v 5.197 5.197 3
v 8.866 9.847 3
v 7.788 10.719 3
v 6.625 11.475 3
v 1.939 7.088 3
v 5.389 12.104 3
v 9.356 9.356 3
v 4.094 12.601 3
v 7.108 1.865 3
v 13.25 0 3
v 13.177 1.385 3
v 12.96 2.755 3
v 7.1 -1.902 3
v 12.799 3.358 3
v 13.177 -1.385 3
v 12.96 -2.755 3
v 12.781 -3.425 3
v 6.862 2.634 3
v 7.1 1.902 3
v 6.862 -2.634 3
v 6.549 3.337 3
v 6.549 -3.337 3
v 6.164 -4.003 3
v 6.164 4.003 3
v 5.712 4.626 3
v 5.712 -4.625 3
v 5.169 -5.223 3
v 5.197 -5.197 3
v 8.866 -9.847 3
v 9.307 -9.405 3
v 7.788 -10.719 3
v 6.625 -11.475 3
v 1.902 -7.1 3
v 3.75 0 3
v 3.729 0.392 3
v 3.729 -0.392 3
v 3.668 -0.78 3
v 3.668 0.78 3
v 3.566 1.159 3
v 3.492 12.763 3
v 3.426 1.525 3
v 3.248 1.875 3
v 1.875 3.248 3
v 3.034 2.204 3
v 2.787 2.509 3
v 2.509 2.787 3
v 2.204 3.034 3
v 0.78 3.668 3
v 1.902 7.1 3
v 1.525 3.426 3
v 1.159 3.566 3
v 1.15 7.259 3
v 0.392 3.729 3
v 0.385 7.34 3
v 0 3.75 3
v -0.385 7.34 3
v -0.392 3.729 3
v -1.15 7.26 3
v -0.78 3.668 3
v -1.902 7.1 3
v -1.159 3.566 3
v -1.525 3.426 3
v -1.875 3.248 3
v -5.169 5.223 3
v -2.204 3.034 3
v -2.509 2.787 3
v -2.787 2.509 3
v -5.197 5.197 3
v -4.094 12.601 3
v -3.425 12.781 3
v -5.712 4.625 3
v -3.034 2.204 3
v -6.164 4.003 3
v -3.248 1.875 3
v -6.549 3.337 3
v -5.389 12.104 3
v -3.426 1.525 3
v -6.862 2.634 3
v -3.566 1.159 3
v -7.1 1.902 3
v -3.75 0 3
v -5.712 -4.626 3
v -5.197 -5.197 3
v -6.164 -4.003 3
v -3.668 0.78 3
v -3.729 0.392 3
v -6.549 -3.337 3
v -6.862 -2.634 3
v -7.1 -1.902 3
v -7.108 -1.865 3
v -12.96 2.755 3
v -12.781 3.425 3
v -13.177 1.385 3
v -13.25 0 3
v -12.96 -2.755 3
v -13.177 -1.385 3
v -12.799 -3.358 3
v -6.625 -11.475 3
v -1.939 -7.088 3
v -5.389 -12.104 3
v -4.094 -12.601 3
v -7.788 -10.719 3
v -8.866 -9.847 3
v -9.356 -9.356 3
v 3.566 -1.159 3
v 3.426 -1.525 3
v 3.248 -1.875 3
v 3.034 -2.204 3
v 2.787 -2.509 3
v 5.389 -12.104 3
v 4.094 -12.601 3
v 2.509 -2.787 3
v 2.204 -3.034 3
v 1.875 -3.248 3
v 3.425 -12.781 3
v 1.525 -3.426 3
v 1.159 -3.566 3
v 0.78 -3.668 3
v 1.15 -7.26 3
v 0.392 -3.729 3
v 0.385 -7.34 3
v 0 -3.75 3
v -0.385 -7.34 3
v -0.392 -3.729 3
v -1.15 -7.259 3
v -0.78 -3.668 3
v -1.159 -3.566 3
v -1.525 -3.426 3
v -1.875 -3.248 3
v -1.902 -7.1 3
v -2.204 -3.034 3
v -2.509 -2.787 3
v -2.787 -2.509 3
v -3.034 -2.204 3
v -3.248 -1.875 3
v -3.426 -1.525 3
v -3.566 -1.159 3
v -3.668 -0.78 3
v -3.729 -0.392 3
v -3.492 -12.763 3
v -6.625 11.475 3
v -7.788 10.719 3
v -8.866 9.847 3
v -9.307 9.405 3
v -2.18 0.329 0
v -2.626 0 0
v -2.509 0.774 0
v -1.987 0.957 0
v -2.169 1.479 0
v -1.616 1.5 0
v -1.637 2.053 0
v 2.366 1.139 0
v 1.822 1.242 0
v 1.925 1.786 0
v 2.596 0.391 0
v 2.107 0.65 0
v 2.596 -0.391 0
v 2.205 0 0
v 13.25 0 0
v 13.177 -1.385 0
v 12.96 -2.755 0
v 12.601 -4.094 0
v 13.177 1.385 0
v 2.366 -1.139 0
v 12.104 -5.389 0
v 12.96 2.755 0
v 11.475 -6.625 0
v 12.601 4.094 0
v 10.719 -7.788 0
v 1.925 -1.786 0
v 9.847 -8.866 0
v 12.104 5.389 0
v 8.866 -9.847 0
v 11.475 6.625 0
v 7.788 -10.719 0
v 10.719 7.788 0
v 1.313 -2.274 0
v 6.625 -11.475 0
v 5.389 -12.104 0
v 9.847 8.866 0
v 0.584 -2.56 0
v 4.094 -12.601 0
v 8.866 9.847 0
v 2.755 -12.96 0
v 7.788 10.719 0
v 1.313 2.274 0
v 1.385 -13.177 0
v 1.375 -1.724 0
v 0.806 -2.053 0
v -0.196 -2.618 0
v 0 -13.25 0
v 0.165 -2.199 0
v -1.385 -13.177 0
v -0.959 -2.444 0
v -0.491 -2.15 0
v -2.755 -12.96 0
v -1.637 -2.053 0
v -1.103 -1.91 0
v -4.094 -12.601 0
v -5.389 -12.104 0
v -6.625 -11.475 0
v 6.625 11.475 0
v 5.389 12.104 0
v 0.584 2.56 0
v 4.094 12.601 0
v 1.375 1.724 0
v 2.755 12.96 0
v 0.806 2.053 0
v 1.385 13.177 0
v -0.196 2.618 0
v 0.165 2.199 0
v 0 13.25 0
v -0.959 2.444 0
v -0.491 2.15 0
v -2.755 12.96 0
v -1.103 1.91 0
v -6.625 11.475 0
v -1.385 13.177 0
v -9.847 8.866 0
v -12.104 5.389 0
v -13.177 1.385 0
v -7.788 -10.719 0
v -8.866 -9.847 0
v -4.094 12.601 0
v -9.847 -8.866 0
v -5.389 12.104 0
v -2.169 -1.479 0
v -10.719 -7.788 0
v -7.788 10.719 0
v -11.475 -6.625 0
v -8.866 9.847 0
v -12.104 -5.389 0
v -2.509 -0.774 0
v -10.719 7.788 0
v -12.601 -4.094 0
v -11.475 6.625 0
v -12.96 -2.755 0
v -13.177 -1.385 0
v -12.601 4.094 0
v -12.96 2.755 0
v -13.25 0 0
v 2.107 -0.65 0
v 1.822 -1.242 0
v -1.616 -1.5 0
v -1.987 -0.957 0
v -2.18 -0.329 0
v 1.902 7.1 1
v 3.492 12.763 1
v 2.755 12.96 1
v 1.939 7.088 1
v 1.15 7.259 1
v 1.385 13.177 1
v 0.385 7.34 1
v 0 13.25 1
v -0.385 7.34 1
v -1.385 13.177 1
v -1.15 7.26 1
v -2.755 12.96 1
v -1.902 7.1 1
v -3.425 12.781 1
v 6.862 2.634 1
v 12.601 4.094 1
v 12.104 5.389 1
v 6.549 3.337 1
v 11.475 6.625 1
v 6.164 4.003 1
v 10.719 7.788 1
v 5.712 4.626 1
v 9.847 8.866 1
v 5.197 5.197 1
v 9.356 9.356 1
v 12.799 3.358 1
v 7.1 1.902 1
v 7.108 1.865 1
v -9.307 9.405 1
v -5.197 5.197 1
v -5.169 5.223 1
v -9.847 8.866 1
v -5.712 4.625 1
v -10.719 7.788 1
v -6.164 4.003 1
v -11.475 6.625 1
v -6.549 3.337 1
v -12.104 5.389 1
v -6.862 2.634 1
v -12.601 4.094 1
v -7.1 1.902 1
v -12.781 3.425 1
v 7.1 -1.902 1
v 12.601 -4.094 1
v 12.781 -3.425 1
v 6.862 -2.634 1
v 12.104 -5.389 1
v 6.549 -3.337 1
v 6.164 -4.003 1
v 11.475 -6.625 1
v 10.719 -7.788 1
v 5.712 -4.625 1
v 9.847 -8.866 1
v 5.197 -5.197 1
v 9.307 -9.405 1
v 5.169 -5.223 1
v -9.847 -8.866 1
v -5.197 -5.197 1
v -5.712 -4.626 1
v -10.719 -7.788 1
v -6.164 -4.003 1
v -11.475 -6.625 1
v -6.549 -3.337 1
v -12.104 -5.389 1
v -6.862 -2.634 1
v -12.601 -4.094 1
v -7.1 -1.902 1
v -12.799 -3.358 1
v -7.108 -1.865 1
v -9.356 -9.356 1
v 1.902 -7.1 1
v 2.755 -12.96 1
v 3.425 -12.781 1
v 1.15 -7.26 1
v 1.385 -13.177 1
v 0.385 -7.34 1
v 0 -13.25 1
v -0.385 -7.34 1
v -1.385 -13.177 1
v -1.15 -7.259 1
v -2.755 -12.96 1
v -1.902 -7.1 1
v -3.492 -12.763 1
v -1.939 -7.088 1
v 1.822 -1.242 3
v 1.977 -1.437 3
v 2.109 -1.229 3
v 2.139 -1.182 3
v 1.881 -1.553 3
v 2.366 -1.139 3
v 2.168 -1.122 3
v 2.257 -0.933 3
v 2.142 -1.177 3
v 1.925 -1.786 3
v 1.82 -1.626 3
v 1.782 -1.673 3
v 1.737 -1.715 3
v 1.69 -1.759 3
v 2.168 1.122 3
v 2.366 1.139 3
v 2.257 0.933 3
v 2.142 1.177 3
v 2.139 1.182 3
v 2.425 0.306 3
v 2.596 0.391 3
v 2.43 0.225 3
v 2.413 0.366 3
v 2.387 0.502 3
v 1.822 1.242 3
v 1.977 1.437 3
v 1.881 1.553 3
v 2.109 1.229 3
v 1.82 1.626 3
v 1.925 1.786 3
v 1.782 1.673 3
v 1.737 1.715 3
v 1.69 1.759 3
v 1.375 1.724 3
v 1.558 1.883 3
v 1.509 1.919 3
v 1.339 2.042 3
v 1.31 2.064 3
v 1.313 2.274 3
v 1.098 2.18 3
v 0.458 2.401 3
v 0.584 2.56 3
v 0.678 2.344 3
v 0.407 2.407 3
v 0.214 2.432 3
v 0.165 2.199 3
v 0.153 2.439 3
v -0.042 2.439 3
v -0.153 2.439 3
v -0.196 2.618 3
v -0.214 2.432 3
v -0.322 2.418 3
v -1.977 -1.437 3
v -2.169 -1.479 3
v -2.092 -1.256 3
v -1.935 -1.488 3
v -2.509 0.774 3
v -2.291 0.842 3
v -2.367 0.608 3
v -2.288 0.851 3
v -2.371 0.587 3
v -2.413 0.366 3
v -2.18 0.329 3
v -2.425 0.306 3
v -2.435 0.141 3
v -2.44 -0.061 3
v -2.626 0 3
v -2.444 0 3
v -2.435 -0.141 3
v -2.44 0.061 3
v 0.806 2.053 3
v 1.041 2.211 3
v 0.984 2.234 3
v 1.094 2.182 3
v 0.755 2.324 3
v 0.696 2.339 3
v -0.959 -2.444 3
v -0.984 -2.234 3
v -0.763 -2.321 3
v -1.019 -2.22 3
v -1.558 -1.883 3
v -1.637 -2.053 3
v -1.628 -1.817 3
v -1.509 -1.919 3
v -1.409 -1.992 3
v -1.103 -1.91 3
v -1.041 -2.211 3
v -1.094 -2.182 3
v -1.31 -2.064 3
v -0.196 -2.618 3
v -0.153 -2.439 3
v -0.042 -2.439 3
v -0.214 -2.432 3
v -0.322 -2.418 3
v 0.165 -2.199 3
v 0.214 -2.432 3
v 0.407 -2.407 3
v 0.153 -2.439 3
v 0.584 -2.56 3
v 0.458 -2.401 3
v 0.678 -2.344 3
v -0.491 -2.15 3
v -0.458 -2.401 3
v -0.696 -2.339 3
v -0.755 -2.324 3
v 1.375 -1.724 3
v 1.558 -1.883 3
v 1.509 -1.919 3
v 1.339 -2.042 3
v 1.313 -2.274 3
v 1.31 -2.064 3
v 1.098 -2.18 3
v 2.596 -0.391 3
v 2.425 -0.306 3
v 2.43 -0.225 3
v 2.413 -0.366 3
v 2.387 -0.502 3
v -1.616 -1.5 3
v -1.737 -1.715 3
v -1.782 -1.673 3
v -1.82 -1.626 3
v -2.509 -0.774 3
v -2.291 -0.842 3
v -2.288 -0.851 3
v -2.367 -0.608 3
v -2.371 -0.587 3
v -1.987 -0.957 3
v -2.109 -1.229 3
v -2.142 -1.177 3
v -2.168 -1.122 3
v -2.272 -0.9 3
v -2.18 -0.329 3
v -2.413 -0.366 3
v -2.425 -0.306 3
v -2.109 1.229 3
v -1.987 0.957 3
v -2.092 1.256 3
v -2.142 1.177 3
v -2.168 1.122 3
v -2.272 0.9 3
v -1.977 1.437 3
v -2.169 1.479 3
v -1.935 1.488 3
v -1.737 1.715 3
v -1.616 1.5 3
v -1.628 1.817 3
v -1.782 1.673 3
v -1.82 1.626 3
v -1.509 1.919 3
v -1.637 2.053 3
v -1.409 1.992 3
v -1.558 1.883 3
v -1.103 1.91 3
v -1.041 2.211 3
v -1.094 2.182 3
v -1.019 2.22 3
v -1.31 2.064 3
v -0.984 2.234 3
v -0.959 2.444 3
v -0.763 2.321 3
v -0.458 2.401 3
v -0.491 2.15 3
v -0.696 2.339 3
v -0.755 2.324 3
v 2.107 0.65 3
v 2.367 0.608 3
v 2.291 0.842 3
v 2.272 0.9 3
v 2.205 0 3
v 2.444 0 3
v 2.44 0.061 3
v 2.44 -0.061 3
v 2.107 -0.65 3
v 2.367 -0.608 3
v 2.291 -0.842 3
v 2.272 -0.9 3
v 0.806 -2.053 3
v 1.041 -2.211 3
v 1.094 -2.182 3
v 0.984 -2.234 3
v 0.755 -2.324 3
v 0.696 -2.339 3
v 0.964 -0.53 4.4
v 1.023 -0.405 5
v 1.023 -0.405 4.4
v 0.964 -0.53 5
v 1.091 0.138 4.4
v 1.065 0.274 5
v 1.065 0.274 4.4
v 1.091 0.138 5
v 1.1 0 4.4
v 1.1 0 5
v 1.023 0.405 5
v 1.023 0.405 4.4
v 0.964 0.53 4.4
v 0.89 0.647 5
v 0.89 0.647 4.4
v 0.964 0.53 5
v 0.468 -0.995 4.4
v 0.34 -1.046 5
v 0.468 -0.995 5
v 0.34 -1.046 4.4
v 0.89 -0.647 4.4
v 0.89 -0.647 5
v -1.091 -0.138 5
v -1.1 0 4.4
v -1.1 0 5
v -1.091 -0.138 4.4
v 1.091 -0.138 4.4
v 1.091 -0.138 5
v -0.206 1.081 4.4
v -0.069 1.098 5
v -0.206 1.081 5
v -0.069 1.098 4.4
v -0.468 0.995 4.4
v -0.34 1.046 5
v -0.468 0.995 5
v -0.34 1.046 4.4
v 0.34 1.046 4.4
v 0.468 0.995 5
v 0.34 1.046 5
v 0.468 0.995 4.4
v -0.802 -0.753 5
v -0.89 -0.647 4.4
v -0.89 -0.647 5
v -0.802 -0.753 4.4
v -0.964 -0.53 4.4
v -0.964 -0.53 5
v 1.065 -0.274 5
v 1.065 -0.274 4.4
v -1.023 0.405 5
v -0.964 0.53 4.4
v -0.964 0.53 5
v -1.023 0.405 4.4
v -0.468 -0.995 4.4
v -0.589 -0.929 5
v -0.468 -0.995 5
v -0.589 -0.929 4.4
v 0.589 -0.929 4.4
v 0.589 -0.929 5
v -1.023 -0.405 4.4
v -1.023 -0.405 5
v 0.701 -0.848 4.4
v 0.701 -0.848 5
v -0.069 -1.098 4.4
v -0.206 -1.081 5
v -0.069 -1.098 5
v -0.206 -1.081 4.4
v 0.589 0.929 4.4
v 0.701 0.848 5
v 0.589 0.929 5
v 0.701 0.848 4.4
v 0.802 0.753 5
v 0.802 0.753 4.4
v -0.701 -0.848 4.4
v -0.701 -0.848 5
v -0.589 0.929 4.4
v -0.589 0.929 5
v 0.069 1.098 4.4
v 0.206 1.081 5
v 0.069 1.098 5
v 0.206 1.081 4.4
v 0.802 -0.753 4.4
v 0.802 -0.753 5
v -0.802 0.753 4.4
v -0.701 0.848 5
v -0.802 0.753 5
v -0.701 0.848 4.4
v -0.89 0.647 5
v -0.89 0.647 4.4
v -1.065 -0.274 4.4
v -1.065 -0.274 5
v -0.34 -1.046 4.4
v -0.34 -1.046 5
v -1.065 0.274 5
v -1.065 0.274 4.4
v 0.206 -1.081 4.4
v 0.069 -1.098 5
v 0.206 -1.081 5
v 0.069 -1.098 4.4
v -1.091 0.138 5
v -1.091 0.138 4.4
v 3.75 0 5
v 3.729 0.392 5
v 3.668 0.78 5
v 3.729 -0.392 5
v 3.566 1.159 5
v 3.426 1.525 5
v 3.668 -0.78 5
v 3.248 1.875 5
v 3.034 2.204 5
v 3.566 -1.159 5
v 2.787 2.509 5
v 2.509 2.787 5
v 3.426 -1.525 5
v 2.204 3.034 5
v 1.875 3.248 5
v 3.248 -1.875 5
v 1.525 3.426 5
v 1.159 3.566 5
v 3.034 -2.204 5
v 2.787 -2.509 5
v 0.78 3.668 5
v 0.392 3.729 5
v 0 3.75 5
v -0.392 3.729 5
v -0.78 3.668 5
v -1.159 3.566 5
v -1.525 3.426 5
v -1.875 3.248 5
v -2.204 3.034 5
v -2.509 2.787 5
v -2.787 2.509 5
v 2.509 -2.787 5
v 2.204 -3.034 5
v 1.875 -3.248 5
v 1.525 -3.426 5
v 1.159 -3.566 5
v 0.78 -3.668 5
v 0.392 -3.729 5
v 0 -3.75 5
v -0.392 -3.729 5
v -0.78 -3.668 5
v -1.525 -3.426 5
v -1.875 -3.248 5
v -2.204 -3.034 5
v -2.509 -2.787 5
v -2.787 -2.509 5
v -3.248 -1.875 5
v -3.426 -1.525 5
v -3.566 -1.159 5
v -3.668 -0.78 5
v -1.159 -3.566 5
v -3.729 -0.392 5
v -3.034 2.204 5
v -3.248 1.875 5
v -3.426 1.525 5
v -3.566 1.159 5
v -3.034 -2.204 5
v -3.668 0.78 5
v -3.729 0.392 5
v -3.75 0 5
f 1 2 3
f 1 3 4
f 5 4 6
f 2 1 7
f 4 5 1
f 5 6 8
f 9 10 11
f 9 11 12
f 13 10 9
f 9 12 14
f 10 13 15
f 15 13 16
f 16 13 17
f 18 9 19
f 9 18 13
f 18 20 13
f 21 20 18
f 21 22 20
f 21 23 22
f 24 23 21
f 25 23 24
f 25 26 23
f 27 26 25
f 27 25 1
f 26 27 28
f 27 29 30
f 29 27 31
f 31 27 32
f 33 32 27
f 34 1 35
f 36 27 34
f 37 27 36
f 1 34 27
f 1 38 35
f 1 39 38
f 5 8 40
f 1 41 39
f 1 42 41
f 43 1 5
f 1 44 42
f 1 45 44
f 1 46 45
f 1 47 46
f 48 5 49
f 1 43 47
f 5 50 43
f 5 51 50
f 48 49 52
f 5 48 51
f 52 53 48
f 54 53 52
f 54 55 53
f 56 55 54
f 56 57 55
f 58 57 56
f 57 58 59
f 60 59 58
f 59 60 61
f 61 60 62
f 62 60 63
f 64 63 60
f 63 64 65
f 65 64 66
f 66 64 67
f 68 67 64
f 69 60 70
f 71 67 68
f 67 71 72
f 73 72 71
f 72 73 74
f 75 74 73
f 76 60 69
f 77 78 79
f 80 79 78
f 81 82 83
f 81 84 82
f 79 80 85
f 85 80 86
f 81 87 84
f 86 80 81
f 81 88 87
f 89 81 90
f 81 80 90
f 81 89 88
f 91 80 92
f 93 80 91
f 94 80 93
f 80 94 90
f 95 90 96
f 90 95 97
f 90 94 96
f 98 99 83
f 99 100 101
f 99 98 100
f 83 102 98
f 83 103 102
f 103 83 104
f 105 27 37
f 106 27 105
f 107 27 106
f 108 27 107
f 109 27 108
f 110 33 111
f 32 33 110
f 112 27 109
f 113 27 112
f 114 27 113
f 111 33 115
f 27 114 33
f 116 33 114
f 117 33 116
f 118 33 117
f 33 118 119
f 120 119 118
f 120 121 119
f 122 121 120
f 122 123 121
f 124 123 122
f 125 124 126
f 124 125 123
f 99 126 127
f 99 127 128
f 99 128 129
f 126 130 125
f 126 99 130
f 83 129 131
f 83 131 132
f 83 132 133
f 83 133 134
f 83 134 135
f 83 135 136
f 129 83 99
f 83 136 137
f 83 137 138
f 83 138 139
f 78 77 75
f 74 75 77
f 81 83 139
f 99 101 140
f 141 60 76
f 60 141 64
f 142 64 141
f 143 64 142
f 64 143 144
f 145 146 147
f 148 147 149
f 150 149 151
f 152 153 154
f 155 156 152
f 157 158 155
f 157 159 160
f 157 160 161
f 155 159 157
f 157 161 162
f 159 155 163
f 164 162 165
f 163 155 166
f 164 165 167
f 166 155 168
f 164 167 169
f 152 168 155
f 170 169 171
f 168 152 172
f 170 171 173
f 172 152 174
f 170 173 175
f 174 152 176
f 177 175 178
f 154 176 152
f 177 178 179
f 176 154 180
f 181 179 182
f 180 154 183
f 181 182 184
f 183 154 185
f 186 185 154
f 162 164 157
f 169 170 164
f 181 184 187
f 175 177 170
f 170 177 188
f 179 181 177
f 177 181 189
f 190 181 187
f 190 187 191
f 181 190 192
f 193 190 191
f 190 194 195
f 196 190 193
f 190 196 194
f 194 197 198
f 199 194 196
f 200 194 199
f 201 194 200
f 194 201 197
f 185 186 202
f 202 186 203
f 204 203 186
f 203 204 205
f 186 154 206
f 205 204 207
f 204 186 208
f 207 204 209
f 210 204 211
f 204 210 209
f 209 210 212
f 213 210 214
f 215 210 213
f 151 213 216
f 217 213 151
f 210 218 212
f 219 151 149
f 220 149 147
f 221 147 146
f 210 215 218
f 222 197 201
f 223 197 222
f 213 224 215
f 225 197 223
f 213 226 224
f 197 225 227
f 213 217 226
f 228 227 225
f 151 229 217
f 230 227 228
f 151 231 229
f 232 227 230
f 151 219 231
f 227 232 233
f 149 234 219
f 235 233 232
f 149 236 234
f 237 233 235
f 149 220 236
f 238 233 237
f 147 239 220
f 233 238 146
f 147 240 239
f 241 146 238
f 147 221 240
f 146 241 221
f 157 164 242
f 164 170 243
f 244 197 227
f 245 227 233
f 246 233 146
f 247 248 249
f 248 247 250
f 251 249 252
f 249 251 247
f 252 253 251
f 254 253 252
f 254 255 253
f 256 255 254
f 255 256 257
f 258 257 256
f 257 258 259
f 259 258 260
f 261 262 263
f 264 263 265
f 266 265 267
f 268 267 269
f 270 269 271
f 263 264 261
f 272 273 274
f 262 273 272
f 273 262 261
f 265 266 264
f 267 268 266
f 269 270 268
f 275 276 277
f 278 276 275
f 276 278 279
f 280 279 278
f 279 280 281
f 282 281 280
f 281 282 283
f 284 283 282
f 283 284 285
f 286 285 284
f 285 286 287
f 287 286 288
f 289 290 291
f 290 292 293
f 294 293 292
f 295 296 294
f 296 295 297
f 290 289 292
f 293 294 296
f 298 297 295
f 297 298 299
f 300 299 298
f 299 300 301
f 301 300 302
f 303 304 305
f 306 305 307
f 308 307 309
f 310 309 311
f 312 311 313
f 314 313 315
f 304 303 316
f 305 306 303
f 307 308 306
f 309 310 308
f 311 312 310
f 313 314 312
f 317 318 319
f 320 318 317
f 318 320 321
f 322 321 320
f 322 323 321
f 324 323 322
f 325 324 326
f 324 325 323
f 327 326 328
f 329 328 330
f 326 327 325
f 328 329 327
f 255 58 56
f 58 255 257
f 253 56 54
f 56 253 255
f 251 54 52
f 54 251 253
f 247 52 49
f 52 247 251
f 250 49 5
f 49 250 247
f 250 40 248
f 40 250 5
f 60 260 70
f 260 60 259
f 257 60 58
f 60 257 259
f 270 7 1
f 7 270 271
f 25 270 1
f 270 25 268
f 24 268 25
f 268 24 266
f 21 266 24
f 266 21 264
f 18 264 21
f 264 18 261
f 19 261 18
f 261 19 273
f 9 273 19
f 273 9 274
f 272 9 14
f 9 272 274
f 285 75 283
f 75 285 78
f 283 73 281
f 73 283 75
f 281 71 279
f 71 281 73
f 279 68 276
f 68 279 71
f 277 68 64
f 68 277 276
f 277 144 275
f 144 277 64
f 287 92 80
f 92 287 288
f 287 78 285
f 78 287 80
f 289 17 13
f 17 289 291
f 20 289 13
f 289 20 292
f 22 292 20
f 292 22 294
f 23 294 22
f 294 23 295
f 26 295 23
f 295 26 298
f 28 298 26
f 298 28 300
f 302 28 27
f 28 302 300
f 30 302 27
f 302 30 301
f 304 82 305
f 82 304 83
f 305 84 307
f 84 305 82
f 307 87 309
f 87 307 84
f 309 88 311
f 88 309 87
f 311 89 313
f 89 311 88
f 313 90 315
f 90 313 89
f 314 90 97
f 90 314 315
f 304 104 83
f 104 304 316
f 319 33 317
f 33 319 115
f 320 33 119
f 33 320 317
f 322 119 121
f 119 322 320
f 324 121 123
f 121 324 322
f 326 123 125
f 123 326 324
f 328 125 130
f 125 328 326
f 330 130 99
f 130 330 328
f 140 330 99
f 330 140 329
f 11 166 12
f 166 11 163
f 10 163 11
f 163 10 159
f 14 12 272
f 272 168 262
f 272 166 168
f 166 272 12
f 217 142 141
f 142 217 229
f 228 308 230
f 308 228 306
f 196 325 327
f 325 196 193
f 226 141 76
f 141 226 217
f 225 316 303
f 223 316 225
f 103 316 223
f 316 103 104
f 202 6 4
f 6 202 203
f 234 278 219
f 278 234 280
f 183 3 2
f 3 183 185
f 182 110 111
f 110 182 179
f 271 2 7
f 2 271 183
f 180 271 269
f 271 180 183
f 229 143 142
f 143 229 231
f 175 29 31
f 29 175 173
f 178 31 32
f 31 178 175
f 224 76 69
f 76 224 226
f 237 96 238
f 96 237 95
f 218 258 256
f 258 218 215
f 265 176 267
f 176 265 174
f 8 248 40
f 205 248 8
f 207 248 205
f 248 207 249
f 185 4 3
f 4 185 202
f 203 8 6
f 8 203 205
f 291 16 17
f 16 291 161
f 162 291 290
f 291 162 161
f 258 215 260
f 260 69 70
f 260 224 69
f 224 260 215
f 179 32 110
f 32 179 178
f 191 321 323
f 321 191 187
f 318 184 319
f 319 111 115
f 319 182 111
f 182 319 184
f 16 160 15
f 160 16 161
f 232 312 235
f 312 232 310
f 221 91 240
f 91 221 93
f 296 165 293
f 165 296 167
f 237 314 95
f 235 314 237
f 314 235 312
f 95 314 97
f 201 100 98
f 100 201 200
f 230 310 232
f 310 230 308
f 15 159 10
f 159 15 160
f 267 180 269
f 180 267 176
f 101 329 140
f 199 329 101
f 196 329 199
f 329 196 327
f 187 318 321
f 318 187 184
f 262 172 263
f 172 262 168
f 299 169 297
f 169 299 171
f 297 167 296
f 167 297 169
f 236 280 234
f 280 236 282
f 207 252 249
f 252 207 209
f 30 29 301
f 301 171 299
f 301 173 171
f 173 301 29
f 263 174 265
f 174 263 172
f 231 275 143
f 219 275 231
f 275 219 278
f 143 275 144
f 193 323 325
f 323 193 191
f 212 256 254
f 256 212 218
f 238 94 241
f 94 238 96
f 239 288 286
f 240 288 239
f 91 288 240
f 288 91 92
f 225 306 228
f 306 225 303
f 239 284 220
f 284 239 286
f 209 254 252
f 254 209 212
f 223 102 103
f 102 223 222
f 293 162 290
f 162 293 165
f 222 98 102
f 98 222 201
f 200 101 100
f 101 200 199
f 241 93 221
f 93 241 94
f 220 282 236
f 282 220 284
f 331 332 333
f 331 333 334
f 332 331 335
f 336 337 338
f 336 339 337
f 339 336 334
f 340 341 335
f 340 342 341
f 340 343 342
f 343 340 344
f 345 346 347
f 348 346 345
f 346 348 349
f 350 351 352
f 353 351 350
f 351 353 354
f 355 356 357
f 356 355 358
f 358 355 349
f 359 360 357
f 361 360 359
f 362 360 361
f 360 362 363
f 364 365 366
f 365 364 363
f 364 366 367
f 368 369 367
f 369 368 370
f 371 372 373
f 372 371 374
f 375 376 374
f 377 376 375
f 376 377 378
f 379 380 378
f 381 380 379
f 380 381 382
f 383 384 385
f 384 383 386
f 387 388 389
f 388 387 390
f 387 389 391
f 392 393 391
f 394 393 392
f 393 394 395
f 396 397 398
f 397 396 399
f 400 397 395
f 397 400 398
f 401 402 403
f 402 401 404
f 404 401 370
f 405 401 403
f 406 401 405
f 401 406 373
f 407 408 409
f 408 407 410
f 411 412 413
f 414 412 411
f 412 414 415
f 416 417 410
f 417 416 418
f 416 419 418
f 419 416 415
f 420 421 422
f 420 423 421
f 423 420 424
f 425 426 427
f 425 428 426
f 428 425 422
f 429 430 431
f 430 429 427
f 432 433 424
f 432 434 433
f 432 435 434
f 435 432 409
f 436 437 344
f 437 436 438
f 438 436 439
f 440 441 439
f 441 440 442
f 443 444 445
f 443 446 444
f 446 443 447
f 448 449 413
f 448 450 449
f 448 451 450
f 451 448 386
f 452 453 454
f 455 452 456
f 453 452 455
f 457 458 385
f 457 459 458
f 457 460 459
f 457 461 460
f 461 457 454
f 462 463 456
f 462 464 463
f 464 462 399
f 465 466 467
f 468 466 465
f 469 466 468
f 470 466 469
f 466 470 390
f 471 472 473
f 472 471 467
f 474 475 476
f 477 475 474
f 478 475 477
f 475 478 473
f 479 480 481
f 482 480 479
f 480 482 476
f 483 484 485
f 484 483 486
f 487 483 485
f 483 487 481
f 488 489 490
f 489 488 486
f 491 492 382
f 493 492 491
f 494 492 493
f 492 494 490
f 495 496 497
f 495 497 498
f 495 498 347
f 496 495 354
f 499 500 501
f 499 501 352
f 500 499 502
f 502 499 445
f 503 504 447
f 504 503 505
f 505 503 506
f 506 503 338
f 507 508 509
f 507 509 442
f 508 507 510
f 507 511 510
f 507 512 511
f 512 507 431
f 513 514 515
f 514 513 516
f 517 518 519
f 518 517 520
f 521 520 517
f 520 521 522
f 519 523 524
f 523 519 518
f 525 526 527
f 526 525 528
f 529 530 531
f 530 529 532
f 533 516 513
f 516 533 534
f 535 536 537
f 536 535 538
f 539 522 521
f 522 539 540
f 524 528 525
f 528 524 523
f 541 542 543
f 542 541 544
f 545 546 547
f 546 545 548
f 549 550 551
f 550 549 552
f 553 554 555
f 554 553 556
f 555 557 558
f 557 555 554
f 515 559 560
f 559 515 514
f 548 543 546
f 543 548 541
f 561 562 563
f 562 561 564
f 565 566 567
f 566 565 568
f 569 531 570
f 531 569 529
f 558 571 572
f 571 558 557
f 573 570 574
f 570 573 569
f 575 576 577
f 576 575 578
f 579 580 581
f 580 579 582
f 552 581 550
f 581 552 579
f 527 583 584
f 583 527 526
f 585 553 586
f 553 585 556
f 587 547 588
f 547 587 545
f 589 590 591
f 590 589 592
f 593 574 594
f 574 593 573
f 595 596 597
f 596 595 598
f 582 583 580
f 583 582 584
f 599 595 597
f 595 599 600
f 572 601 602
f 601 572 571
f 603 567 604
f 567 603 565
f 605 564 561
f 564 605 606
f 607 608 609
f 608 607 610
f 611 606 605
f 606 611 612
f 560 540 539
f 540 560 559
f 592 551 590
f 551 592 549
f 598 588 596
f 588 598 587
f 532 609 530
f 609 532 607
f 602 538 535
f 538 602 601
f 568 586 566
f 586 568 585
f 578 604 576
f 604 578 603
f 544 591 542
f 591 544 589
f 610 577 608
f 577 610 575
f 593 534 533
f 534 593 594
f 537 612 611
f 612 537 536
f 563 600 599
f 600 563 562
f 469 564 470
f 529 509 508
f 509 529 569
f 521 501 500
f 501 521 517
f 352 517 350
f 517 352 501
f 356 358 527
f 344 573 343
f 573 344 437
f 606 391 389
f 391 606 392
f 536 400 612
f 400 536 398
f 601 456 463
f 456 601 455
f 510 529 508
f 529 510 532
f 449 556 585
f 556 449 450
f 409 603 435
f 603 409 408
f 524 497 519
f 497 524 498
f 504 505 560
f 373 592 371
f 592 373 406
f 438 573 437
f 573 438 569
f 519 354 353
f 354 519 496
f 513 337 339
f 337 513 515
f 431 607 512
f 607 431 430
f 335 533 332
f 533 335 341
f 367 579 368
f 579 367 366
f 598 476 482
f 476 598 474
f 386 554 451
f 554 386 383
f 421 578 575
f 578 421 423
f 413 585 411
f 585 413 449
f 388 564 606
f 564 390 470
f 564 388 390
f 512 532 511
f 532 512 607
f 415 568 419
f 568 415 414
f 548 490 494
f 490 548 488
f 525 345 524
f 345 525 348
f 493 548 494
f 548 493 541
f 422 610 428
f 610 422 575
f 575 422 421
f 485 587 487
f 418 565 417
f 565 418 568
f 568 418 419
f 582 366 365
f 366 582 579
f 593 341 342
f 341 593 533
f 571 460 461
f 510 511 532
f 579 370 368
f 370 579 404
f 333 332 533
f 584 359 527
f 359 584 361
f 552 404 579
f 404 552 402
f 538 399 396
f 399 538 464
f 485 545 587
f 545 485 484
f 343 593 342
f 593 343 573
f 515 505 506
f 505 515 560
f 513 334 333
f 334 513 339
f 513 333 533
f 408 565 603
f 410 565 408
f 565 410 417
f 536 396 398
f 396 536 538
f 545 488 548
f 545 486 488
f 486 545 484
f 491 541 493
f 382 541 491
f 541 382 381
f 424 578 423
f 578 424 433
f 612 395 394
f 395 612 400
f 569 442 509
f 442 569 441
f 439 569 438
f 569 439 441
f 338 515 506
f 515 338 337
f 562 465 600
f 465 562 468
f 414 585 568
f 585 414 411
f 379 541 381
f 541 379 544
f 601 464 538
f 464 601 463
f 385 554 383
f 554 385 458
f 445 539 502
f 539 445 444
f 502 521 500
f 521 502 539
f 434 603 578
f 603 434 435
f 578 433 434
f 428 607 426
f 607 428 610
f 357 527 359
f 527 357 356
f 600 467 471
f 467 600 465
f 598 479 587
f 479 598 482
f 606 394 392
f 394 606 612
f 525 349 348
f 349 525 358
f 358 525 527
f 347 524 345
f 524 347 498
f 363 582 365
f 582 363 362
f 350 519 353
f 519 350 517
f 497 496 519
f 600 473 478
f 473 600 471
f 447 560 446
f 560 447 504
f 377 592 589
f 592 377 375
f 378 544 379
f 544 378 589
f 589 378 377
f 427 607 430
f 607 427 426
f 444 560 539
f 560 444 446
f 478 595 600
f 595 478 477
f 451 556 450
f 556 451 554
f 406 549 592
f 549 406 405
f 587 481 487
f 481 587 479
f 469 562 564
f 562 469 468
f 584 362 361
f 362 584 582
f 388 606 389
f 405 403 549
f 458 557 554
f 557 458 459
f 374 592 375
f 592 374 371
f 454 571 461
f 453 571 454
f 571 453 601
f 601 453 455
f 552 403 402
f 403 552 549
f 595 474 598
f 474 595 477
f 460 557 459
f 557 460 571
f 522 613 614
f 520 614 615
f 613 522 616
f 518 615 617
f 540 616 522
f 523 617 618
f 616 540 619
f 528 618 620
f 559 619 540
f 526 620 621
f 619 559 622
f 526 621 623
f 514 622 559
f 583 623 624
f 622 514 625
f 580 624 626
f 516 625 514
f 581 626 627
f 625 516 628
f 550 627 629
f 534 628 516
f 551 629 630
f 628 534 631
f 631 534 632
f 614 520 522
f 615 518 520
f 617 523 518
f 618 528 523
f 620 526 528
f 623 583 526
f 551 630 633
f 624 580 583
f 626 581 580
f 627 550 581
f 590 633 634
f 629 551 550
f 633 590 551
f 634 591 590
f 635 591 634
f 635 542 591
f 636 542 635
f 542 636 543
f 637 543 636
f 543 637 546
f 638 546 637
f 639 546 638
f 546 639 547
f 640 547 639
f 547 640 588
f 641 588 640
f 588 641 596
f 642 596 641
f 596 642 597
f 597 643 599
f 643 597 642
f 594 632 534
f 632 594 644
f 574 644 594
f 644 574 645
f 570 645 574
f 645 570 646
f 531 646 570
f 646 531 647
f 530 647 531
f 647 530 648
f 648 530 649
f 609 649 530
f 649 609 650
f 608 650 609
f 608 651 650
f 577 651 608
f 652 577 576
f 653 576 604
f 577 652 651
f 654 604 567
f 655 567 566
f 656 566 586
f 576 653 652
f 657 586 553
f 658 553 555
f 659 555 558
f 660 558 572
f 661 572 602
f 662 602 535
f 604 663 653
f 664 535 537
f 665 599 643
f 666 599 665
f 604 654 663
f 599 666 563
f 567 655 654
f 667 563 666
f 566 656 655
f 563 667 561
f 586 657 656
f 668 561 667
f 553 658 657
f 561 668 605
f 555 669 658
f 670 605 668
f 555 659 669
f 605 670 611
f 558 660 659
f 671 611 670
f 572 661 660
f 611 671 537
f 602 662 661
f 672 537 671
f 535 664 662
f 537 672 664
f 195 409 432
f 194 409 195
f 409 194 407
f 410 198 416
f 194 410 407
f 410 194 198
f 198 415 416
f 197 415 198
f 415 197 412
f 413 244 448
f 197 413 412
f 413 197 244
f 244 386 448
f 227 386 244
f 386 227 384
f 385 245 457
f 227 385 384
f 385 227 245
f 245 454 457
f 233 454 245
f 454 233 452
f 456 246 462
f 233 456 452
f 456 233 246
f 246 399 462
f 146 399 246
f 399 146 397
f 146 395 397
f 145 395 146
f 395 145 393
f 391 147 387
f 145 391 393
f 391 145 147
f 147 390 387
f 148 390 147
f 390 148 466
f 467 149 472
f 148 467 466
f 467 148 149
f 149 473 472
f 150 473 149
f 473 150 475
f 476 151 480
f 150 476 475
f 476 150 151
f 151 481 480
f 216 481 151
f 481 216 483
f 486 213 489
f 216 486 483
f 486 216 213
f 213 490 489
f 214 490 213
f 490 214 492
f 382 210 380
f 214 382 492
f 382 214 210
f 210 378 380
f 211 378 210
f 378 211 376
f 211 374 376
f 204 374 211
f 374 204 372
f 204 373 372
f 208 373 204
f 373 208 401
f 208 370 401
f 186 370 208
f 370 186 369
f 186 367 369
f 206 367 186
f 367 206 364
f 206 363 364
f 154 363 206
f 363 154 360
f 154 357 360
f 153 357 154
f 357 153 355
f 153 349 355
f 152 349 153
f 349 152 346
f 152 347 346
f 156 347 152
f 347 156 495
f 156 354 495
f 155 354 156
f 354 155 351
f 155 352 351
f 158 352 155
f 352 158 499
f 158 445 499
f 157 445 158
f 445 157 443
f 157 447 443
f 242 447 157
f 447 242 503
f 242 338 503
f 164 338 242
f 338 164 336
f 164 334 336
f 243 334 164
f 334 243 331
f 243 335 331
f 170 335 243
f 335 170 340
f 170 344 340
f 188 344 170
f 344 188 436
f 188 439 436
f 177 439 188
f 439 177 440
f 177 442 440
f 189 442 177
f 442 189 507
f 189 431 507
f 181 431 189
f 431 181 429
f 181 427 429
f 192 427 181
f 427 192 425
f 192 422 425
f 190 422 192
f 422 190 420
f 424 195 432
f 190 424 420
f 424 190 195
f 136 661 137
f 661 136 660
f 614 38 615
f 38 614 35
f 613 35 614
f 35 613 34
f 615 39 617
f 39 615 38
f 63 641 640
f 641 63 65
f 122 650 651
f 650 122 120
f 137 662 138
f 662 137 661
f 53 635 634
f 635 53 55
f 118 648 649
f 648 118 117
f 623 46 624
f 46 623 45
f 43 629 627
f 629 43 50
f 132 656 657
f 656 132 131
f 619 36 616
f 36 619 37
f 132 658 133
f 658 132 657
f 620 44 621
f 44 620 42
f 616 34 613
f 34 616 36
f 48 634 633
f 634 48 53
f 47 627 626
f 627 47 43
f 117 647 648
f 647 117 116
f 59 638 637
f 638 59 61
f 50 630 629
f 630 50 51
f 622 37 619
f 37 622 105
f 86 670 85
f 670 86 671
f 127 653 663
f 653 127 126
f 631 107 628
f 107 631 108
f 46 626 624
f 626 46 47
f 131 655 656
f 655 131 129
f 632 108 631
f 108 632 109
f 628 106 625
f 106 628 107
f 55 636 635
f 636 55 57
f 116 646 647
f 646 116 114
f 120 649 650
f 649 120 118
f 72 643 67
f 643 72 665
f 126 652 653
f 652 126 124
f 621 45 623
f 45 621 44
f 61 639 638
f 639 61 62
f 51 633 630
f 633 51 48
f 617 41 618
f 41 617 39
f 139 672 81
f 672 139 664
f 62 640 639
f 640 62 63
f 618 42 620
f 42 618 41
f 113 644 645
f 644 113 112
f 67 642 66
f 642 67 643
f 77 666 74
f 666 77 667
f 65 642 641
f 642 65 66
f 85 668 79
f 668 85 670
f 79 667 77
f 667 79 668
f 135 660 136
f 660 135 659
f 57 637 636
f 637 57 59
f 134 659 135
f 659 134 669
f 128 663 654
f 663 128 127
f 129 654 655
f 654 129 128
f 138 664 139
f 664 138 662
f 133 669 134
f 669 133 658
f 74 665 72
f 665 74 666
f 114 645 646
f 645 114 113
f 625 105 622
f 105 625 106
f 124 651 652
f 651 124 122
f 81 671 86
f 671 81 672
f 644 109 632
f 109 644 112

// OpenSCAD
// file: motor-shaft-adapter.scad
/*
Copyright (c) 2017 Paul Austin - SDG

Permission is hereby granted, free of charge, to any person obtaining a copy
of this software and associated documentation files (the "Software"), to deal
in the Software without restriction, including without limitation the rights
to use, copy, modify, merge, publish, distribute, sublicense, and/or sell
copies of the Software, and to permit persons to whom the Software is
furnished to do so, subject to the following conditions:

The above copyright notice and this permission notice shall be included in all
copies or substantial portions of the Software.

THE SOFTWARE IS PROVIDED "AS IS", WITHOUT WARRANTY OF ANY KIND, EXPRESS OR
IMPLIED, INCLUDING BUT NOT LIMITED TO THE WARRANTIES OF MERCHANTABILITY,
FITNESS FOR A PARTICULAR PURPOSE AND NONINFRINGEMENT. IN NO EVENT SHALL THE
AUTHORS OR COPYRIGHT HOLDERS BE LIABLE FOR ANY CLAIM, DAMAGES OR OTHER
LIABILITY, WHETHER IN AN ACTION OF CONTRACT, TORT OR OTHERWISE, ARISING FROM,
OUT OF OR IN CONNECTION WITH THE SOFTWARE OR THE USE OR OTHER DEALINGS IN THE
SOFTWARE.
*/

$fn = 50;

// A spline hub typical of sg90 servos. The number of splines vary some are
// 20 some are 21, diameter varies as well.
module coreHub(splineCount = 20, h = 4.5, splineH = 3, splineD=5.0, d = 8.5) {

    // Approx spline shaft diameters
    // sg90(subMicro) - 5mm
    // micro          - 6mm
    screwFlangeThickness = 3.7;
    screwHeadDiameter = 5;
    screwShaftDiameter = 2.2;
    coreH= h;

    // The main shaft hub
    difference() {
        cylinder($fn = 6, d=d, h=splineH);
        cylinder(d=splineD+0.35, h=splineH);
    }

    // Splines on the inside of the hub
    color("red") linear_extrude(splineH)
    for ( rib = [0:(360/splineCount):360]) {
        // Pivot aroung origin
        rotate([0,0,rib])
        // Move out from origin
        translate([splineD/2+0.2,0,0])
        // Make corner face origin
        rotate([0,0,45])
        // Make a square
        square([0.7,0.7], center = true);
    }

    // Hole for the screw
    color("green") difference() {
        translate([0,0,splineH]) cylinder($fn = 6, d=d,h=(coreH - splineH));
        union() {
            translate([0,0,splineH]) cylinder(d=screwShaftDiameter, h=screwFlangeThickness);
            translate([0,0,splineH+screwFlangeThickness]) cylinder(d=screwHeadDiameter,h=5);
            translate([0,0,1.9]) cylinder(h=2.5, d1 = 7, d2 = screwShaftDiameter);
        }
    }

}

rotate([0,0,0]) coreHub(splineCount = 21, coreH = 10, d = 8.4);
// file: hub.scad
/*
Copyright 2017 Trashbots Inc.

Licensed under the Apache License, Version 2.0 (the "License");
you may not use this file except in compliance with the License.
You may obtain a copy of the License at

    http://www.apache.org/licenses/LICENSE-2.0

Unless required by applicable law or agreed to in writing, software
distributed under the License is distributed on an "AS IS" BASIS,
WITHOUT WARRANTIES OR CONDITIONS OF ANY KIND, either express or implied.
See the License for the specific language governing permissions and
limitations under the License.
*/

$fn=60;

use <motor-shaft-adapter.scad>

// dimensions units in mm
slatWidth = 10;
slatDepth = 10;
slatThickness = 1.9;
stickDiameter = 6;
hubDiameter = 20;
coreDiameter = 6.9;

// Strategy
// 1. Core hub + spline core
// 2. Remove slots
// 3. Remove compression slots

// Version history
//  v0.1.0 Initial print test for Reynosa trip
//  v0.1.2 Widened slot to 10.2mm, and chamfer used vars
//  v0.1.3 Peg insets are 0.15mm deeper to allow for printing
//  v0.1.4 Peg insets are 0.2mm deeper to allow for printing

// Cylinder with slot in it for optional key, and bevel
module slottedShaft(d=8, h=10) {
    slotWidth = 10.2;
    slotThickness = 2.1;
    chamfer = 1.1;
    cylinder(d=d,h=h);
    translate([0,0,h-2.1]) cylinder(r2=(d/2)+chamfer, r1=(d/2), h=2.1);
    translate([-(slotWidth/2),-(slotThickness/2),0]) cube([slotWidth,slotThickness,h]);
    translate([0,0,0]) cylinder(r1=(d/2)+chamfer, r2=(d/2), h=2.1);
}

// Consolidate this wiht one above
// Cylinder with slot in it for optional key, and bevel
module slottedShaftGear(d=8, h=10) {
    cylinder(d=d,h=h);
    translate([0,0,h-2.1]) cylinder(r2=(d/2)+1,r1=(d/2),h=2.1);
    translate([-5.05,-1.05,0]) cube([10.1,2.1,h]);
}

// Cylinder with slot in it for optional key, and bevel
module slottedShaft2(d=8, h=10) {
    platThickness = 1.5;
    bevelThicknes = 1.0;
    cylinder(d=d,h=h);
    translate([0,0,h-platThickness-bevelThicknes])
        cylinder(r2=(d/2)+1,r1=(d/2),h=bevelThicknes);
    translate([0,0,platThickness]) cylinder(r1=(d/2)+1,r2=(d/2),h=bevelThicknes);
    translate([-5.05,-1.05,0]) cube([10.1,2.1,h]);
}



// Hub
module plugHub(plugCount = 6) {
    difference() {
        color("cyan") rotate_extrude() {
            difference(){
                translate([0,0,0]) square([hubDiameter,slatWidth]);
                translate([hubDiameter+2,slatWidth/2,0]) circle(d=slatWidth-1);
            }
        }

        #union () {
            slottedShaft();
           // coreHub(h = slatWidth, splineCount = 21, splineH = 3, d = 10.5);
           // translate([0,0,-0.5]) cylinder(h = slatWidth+1, d = coreDiameter);
            for(i=[0:(360/plugCount):360]) {
                translate([0,0,0])
                rotate(i)
                translate([hubDiameter-slatDepth,0,-0.5]) rotate([90,0,0])  {
                    // Slot for a popsicle stick
                    translate([0,0,-slatThickness/2])
                    linear_extrude(slatThickness) square([slatDepth,slatWidth+1]);

                    // Carve out back of slot as well
                    translate([3.3,(slatWidth+1)/2,-slatThickness/2])   cylinder(h = slatThickness, d = slatWidth*1.2);

                    // Cylinder for straw
                    translate([0,(slatWidth+1)/2,0])
                    rotate([90,0,90]) cylinder(d=stickDiameter, h=slatDepth);
                }
            }
        }
    }
}

module circlePegs (pegs = 6, diameter = 26.8, innerDiameter = 15, height = 3, fudge = 1.04) {
    step        = 360 / pegs;

    // Additional amount keeps the plug from binding too hard when
    // pluged into a complimentary part.
    halfStep    = (step / 2) * fudge;
    radius      = (diameter / 2);
    pegHeight   = height;

    rotate (-step/4)
    linear_extrude(height=pegHeight)
    difference () {
        difference() {
            circle(d=diameter);
            circle(d=innerDiameter);
        }
        for (i = [0:step:360]) {
            // The diameter is used so the triangle is much longer than the edges need
            // but long enough to clear out the entire wedge.
            polygon([
                    [0,0],
                    [diameter * cos(i), diameter * sin(i) ],
                    [diameter * cos(i + (halfStep)), diameter * sin(i+(halfStep)) ]
                    ]);
        }
    }
}

module circlePegsWithBase(pegs = 6, diameter = 26.8, innerDiameter = 15, heigth = 6) {
    baseHieght  = heigth / 2;

    translate([0,0,-baseHieght]) linear_extrude(heigth/2) circle(d=diameter);
    circlePegs(pegs, diameter, innerDiameter, heigth/2);
}


module pegPlugHub(pegCount = 6, pegHeight = 2.5) {

    // When subtracting teh pegs, make them bit larger, and deeper.
    // TODO pull these tweak to high level settings, they may apply to to multiple pieces.
    difference() {
        rotate([0,0,-15]) plugHub(plugCount = pegCount);
        rotate([0,0,-15]) circlePegs(pegs = pegCount, diameter=27.0, height=pegHeight+0.2, innerDiameter = 14.7, fudge = 0.99);
    }

    translate ([0,0,10]) rotate([0,0,-15]) circlePegs(pegs = pegCount, diameter=26.8, height=pegHeight);
}

module insetpegPlugHub(pegCount = 6, pegHeight = 2.5) {
    difference() {
        pegPlugHub(pegCount = 6, pegHeight = 2.5);
        union() {
            offset([0,0,8]) clyinder(r1=9,r2=9,h=2);
        }
    }
}

// Rotaate 15deg to aling a set of slots along hte 45deg axis, this helps with
// default file and surface fills
//rotate([0,0,-15]) plugHub(plugCount = 6);
intersect() {
    translate([60,0,0]) rotate([0,0,-15]) pegPlugHub(plugCount = 6, pegHeight = 2.5);

    // add cube so we can get a cross section.
}
// main file
/*
Copyright 2017 Trashbots Inc.

Licensed under the Apache License, Version 2.0 (the "License");
you may not use this file except in compliance with the License.
You may obtain a copy of the License at

    http://www.apache.org/licenses/LICENSE-2.0

Unless required by applicable law or agreed to in writing, software
distributed under the License is distributed on an "AS IS" BASIS,
WITHOUT WARRANTIES OR CONDITIONS OF ANY KIND, either express or implied.
See the License for the specific language governing permissions and
limitations under the License.
*/

$fn = 60;

use <hub.scad>

use <motor-shaft-adapter.scad>

difference() {
    cylinder(d=26.5,h=3);
    union() {
        cylinder(d=7,h=3);
        translate([0,0,1])
        circlePegs(pegs = 6, diameter=27.0, height=2, innerDiameter = 14.7, fudge = 0.99);
    }
}

intersection() {
    cylinder(d=7.5,h=10);
    rotate([0,0,0]) coreHub(splineCount = 21, h= 5, coreH = 11, d = 9.4);
}
